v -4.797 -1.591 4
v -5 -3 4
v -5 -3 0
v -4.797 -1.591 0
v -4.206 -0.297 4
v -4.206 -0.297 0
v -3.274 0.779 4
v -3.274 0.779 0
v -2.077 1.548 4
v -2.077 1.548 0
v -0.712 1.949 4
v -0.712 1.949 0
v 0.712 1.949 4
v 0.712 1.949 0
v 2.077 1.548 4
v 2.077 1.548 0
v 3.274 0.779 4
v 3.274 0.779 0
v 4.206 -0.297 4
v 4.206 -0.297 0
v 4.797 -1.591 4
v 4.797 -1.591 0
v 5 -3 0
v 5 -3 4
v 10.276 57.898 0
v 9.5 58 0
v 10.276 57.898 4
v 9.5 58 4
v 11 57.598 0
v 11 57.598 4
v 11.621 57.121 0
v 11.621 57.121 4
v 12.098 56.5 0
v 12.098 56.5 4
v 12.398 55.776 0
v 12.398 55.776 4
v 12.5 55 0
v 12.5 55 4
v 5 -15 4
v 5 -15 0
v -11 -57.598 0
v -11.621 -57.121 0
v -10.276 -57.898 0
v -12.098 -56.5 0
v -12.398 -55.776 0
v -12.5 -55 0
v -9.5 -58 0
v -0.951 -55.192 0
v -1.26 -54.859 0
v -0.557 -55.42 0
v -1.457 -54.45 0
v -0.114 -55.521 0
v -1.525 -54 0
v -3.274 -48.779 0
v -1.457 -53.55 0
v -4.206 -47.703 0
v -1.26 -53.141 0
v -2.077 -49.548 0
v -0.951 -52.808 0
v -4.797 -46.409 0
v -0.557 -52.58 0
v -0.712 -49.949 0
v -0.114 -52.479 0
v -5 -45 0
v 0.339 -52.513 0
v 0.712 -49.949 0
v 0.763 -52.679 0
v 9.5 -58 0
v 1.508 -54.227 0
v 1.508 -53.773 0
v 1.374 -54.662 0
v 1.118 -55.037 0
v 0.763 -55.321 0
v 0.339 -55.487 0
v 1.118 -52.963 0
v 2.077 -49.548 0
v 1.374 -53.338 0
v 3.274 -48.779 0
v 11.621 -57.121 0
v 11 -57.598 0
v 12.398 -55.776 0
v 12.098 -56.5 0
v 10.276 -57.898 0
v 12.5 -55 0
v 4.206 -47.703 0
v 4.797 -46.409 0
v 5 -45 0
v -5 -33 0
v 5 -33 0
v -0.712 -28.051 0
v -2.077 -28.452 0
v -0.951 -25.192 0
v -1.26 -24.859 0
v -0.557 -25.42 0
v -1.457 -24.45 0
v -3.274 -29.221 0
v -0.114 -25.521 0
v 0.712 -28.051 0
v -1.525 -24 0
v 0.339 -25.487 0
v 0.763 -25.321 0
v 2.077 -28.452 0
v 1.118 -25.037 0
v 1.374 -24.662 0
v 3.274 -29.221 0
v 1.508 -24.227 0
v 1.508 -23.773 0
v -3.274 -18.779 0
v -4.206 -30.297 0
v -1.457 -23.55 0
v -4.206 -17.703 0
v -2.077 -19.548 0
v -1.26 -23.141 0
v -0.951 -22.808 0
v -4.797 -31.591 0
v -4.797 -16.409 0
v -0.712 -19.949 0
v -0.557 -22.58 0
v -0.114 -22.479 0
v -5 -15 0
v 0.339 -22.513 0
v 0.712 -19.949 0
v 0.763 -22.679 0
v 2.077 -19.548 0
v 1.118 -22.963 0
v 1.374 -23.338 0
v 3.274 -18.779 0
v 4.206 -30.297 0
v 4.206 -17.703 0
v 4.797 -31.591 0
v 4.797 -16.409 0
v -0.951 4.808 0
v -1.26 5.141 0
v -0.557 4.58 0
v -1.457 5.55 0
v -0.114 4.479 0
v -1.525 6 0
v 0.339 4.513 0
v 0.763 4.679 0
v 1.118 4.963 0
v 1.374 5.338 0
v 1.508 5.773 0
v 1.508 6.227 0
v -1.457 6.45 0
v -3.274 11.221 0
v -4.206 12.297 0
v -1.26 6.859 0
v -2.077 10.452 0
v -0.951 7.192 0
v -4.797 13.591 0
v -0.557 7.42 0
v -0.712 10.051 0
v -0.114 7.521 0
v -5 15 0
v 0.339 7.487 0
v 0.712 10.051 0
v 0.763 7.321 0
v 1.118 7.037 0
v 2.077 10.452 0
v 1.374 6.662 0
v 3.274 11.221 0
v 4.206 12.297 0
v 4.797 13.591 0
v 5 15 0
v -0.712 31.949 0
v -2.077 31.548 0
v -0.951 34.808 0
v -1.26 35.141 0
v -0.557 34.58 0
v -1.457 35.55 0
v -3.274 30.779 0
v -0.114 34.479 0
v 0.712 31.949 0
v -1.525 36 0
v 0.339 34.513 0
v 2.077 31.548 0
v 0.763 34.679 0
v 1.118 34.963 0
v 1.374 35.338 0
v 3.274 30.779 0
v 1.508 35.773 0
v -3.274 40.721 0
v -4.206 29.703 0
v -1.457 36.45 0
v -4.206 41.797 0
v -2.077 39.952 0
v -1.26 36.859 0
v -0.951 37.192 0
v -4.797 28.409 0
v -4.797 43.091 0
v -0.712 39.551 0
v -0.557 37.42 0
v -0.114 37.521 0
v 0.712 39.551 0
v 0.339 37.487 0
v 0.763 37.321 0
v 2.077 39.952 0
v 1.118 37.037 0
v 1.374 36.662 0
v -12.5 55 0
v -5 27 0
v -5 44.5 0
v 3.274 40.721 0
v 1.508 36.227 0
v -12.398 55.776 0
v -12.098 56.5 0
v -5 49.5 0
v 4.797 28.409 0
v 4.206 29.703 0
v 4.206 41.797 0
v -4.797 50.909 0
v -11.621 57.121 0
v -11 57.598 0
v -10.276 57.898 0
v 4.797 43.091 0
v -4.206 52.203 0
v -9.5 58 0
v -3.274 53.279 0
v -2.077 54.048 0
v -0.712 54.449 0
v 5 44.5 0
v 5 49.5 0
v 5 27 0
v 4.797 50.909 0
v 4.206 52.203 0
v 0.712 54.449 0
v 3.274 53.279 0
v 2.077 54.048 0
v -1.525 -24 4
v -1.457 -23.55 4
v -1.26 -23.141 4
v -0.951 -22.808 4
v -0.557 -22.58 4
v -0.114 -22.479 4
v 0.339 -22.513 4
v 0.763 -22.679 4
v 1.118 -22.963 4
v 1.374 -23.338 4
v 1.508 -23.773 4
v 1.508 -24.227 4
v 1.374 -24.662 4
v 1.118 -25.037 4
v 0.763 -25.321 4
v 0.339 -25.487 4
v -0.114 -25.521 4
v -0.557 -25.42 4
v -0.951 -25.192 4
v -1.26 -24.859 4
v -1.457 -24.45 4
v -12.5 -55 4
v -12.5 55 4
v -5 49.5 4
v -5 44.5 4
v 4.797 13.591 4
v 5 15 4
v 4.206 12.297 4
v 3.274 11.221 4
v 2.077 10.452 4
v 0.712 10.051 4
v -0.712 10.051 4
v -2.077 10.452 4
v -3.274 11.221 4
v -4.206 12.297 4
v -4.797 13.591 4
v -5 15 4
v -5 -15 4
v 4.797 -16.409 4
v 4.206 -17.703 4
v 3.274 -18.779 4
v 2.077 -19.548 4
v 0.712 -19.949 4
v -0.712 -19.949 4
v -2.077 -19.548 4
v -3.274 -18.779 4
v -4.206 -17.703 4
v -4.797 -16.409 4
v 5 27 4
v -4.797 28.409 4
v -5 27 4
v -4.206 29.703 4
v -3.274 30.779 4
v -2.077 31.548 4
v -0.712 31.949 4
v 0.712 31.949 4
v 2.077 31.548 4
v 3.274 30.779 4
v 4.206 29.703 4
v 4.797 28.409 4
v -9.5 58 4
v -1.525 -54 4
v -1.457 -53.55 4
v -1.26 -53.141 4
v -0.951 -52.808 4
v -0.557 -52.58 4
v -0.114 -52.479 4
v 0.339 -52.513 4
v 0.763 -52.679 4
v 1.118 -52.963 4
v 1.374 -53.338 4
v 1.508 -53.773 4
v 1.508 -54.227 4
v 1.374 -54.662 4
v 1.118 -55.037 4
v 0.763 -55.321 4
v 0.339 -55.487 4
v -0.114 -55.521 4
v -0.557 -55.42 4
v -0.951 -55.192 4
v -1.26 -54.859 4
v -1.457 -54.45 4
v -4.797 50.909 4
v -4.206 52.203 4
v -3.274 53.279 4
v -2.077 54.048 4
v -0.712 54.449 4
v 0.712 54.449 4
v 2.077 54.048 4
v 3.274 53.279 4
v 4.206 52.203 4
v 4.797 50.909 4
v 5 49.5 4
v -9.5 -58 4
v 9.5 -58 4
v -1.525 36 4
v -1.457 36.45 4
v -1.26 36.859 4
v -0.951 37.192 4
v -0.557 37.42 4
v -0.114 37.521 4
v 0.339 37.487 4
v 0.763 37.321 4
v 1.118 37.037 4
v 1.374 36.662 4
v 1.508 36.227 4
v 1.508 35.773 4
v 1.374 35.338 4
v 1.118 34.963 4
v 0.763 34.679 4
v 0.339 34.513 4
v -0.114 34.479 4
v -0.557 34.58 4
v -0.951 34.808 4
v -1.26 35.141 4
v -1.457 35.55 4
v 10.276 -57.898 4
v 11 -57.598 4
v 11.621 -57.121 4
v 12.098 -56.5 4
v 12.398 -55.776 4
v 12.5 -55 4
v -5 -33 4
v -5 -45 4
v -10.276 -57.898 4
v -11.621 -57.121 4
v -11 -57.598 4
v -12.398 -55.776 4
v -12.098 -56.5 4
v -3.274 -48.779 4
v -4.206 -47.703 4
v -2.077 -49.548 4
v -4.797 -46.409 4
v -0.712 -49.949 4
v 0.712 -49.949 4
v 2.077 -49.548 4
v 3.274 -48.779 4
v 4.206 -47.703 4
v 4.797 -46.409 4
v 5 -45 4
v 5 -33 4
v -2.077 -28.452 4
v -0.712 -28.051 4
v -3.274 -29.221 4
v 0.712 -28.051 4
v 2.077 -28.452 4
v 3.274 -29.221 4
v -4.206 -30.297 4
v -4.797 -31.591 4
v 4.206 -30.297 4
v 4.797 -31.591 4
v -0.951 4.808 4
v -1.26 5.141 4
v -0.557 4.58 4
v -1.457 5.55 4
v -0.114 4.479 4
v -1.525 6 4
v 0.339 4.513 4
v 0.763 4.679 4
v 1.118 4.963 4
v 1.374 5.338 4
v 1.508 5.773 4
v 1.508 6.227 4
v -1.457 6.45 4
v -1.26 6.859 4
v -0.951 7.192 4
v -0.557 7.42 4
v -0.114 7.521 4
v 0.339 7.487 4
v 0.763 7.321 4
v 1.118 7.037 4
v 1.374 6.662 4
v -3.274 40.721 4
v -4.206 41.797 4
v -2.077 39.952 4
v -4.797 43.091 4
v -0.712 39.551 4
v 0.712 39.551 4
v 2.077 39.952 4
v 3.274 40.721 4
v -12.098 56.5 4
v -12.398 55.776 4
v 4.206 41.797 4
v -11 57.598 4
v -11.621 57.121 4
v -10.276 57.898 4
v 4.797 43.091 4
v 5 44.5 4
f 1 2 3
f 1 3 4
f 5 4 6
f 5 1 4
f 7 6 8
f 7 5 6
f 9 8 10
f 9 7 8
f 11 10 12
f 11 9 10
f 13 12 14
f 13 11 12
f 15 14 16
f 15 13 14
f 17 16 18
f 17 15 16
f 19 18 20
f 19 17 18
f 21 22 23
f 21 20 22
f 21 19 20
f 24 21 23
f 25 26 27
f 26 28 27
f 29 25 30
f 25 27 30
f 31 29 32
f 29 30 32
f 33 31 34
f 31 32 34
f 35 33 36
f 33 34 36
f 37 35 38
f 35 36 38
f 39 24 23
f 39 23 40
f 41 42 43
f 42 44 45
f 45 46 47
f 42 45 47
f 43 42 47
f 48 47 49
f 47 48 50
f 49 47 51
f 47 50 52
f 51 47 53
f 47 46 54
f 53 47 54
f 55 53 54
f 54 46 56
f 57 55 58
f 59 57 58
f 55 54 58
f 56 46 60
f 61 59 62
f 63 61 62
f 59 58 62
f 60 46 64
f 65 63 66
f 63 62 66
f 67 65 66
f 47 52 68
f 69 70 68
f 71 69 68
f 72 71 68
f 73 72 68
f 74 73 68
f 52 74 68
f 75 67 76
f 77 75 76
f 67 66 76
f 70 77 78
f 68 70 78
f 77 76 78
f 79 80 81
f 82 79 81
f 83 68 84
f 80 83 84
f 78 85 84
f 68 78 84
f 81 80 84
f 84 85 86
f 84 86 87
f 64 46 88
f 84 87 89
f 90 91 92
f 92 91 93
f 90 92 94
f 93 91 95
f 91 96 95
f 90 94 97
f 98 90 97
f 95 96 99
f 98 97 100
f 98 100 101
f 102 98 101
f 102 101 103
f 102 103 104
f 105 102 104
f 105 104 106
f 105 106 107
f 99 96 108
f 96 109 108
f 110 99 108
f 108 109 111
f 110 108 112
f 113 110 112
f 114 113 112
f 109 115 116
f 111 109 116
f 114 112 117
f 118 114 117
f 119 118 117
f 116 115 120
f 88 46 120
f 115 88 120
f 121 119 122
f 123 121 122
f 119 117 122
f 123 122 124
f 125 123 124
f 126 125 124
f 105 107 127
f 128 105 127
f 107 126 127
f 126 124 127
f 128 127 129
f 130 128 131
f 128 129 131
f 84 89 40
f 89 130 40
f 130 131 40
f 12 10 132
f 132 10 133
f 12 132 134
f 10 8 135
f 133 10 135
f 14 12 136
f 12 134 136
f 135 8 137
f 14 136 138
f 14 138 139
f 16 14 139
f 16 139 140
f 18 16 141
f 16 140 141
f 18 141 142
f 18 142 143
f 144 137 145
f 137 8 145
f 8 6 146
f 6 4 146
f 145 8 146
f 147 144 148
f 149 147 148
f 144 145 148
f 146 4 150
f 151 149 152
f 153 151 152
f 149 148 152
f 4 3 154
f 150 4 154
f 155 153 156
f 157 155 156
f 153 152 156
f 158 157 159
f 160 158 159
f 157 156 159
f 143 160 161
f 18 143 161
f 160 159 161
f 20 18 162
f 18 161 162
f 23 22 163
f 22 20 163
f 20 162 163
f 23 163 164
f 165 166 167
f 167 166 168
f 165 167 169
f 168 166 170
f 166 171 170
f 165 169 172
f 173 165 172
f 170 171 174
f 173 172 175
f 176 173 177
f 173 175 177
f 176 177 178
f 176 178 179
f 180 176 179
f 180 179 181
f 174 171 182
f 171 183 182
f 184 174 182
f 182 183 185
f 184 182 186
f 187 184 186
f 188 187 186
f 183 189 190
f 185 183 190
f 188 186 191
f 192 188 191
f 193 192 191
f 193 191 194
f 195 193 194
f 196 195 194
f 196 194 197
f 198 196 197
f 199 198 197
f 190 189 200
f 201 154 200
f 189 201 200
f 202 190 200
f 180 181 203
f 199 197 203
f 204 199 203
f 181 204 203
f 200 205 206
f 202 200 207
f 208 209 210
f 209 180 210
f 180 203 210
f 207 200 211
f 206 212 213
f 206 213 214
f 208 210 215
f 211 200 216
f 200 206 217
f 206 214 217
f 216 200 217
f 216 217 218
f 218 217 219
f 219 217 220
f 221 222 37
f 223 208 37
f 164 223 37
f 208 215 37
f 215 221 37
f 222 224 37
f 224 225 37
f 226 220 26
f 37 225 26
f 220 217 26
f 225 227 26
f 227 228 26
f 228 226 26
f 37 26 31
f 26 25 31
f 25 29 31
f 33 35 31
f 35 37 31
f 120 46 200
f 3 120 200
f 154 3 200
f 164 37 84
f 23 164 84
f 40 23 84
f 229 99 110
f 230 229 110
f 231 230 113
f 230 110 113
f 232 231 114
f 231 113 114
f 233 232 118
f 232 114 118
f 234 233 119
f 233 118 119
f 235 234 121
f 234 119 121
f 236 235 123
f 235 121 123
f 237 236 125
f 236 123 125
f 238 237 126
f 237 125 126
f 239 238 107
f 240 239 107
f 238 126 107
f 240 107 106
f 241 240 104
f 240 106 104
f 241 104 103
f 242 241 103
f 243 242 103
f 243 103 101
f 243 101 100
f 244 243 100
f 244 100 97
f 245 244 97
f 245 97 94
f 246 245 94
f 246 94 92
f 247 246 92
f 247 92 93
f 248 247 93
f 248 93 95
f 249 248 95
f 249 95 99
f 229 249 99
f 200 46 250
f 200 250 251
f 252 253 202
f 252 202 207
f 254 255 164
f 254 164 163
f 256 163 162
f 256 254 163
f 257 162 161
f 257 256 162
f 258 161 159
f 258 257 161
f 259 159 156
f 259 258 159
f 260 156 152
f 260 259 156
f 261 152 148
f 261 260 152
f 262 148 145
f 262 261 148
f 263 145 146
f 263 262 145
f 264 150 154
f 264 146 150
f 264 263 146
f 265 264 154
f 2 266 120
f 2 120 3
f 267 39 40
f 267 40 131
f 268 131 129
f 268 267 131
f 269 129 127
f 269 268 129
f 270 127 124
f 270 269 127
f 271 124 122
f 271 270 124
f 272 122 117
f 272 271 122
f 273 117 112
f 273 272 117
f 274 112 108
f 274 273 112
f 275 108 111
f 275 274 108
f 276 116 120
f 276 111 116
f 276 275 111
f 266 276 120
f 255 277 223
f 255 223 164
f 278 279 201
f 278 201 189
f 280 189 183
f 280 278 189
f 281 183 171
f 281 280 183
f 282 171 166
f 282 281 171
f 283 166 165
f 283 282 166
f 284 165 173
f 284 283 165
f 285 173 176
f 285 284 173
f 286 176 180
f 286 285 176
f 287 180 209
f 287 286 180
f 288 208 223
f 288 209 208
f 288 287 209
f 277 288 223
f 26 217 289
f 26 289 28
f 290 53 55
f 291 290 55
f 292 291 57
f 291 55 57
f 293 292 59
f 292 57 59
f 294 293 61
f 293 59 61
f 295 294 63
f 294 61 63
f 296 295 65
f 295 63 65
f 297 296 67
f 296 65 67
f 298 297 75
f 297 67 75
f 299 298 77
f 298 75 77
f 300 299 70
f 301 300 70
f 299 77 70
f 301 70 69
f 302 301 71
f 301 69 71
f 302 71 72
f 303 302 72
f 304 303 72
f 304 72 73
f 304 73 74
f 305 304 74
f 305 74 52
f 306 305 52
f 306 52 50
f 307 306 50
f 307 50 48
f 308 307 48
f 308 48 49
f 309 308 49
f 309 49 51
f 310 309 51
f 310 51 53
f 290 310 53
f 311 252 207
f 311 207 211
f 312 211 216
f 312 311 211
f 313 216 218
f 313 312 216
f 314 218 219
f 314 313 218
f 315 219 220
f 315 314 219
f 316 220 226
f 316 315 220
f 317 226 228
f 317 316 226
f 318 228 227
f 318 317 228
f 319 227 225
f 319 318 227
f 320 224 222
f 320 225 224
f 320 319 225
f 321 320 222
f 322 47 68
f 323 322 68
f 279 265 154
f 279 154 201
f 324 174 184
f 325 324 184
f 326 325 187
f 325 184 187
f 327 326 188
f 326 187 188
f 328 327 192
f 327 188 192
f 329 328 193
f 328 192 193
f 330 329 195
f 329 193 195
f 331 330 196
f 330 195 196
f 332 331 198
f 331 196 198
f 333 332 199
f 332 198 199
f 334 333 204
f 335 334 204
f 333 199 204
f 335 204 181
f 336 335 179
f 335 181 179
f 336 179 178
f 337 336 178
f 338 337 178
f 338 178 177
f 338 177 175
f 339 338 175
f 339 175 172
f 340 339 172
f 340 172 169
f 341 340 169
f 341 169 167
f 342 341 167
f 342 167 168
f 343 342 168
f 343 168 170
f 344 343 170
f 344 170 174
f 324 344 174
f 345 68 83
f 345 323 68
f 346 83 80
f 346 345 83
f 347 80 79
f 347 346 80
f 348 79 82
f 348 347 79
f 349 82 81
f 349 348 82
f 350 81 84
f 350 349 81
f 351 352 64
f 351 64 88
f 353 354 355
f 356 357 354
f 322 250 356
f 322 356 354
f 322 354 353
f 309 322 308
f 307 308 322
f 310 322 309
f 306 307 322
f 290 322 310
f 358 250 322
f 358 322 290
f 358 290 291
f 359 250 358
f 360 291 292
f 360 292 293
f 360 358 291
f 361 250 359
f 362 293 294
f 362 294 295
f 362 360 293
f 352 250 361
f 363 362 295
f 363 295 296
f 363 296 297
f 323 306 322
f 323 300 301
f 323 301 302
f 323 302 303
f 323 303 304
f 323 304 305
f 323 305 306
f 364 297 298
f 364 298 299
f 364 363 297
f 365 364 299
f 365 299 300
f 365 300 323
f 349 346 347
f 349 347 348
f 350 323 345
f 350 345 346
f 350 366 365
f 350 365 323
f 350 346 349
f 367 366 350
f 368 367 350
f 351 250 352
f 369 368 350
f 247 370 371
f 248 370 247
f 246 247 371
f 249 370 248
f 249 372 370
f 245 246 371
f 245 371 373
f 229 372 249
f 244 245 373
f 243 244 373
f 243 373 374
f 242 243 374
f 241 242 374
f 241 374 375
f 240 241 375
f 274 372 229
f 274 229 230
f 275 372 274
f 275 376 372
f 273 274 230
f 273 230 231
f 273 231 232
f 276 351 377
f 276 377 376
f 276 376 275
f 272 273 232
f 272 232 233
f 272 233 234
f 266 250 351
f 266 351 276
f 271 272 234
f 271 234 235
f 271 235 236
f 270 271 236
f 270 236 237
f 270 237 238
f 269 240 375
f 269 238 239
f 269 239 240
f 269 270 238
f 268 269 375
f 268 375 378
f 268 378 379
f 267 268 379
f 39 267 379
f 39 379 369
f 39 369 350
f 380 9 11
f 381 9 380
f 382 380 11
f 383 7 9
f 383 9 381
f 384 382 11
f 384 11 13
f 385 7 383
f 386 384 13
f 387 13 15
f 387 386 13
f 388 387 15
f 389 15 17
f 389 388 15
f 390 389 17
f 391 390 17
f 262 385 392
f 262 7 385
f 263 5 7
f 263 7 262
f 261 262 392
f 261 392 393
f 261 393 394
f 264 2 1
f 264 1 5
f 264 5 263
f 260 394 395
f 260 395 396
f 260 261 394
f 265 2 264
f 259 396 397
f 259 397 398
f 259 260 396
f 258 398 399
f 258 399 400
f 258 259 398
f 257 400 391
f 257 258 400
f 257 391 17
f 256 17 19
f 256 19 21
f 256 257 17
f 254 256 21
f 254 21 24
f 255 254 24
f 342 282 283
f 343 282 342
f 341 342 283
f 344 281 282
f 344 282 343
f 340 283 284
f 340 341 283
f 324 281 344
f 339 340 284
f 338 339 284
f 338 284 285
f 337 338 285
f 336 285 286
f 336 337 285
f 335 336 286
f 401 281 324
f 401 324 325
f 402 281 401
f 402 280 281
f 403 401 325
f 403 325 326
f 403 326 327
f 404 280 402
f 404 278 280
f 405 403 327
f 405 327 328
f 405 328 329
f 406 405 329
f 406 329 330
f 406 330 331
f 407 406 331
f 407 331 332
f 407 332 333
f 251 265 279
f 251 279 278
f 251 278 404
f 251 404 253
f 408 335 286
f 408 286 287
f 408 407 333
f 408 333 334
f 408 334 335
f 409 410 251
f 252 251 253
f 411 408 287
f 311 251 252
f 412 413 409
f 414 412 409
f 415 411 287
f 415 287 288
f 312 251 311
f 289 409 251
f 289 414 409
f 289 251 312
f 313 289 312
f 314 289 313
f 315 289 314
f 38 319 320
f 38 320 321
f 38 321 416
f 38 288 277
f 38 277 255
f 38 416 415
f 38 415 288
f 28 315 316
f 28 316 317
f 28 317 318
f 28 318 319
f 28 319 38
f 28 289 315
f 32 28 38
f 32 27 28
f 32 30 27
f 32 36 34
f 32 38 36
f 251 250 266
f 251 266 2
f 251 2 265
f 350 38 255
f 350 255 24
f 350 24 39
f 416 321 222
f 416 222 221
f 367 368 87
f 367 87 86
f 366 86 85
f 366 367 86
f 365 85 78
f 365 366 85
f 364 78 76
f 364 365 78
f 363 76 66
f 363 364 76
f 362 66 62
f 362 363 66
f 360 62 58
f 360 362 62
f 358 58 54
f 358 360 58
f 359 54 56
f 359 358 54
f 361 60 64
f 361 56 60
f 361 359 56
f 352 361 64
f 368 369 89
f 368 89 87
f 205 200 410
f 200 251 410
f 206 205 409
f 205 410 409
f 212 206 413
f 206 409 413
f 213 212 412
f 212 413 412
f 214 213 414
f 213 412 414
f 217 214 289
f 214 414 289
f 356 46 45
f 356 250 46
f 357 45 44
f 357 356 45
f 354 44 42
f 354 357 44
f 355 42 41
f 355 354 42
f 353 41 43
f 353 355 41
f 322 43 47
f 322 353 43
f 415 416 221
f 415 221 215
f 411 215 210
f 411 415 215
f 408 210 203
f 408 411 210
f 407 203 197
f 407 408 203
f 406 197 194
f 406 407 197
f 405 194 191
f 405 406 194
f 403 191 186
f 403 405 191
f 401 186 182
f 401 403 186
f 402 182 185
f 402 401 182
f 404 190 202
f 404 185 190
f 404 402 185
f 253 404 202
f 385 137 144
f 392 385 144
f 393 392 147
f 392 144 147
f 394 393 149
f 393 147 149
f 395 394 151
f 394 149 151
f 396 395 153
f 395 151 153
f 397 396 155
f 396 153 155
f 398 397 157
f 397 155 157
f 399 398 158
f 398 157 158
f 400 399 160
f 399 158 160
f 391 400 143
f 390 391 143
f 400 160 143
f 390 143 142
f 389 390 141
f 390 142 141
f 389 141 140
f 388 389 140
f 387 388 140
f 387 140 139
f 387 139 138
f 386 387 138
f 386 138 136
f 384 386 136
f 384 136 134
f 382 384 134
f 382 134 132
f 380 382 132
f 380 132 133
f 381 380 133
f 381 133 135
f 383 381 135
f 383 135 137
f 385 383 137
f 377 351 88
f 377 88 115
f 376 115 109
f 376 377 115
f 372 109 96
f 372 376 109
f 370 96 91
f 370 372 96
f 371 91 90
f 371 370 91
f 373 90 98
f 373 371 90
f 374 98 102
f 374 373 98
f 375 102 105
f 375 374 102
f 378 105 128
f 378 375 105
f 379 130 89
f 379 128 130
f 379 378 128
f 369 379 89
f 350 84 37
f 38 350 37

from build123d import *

# Parameters (mm, degrees)
SKETCH_1_W               = 25
SKETCH_1_H               = 116
EXTRUDE_1_DEPTH          = 4
SKETCH_2_R               = 1.525
CUT_EXTRUDE_1_DEPTH      = 1
CUT_EXTRUDE_1_DEPTH_BACK = 5
FILLET_1_R               = 3
CUT_EXTRUDE_2_DEPTH      = 1
CUT_EXTRUDE_2_DEPTH_BACK = 5


with BuildPart() as part:
    # 草图1 → 凸台-拉伸1 (new body)
    with BuildSketch(Plane.XY):
        Rectangle(SKETCH_1_W, SKETCH_1_H)
    extrude(amount=EXTRUDE_1_DEPTH)

    # 草图2 → 切除-拉伸1 (cut, two sides)
    with BuildSketch(Plane(origin=(0, 0, 0), x_dir=(-1, 0, 0), z_dir=(0, 0, -1))) as cut_extrude_1_sk:
        with Locations((0, -54.000000001)):
            Circle(SKETCH_2_R)
        with Locations((0, -24.000000001)):
            Circle(SKETCH_2_R)
        with Locations((0, 5.999999999)):
            Circle(SKETCH_2_R)
        with Locations((0, 35.999999999)):
            Circle(SKETCH_2_R)
    extrude(amount=CUT_EXTRUDE_1_DEPTH, mode=Mode.SUBTRACT)
    extrude(cut_extrude_1_sk.sketch, amount=-CUT_EXTRUDE_1_DEPTH_BACK, mode=Mode.SUBTRACT)

    # 圆角1
    fillet_1_edges = [part.edges().sort_by_distance(p)[0] for p in [
        (12.5, -58, 2),
        (-12.5, -58, 2),
        (-12.5, 58, 2),
        (12.5, 58, 2),
    ]]
    fillet(fillet_1_edges, radius=FILLET_1_R)

    # 草图4 → 切除-拉伸2 (cut, two sides)
    with BuildSketch(Plane.XY.offset(4)) as cut_extrude_2_sk:
        with BuildLine():
            Line((-5, 14.999999999), (-5, 26.999999999))
            ThreePointArc((-5, 26.999999999), (0, 31.999999999), (5, 26.999999999))
            Line((5, 26.999999999), (5, 14.999999999))
            ThreePointArc((5, 14.999999999), (0, 9.999999999), (-5, 14.999999999))
        make_face()
        with BuildLine():
            Line((-5, -45.000000001), (-5, -33.000000001))
            ThreePointArc((-5, -33.000000001), (0, -28.000000001), (5, -33.000000001))
            Line((5, -33.000000001), (5, -45.000000001))
            ThreePointArc((5, -45.000000001), (0, -50.000000001), (-5, -45.000000001))
        make_face()
        with BuildLine():
            Line((-5, -15.000000001), (-5, -3.000000001))
            ThreePointArc((-5, -3.000000001), (0, 1.999999999), (5, -3.000000001))
            Line((5, -3.000000001), (5, -15.000000001))
            ThreePointArc((5, -15.000000001), (0, -20.000000001), (-5, -15.000000001))
        make_face()
        with BuildLine():
            Line((-5, 44.499999999), (-5, 49.499999999))
            ThreePointArc((-5, 49.499999999), (0, 54.499999999), (5, 49.499999999))
            Line((5, 49.499999999), (5, 44.499999999))
            ThreePointArc((5, 44.499999999), (0, 39.499999999), (-5, 44.499999999))
        make_face()
    extrude(amount=CUT_EXTRUDE_2_DEPTH, mode=Mode.SUBTRACT)
    extrude(cut_extrude_2_sk.sketch, amount=-CUT_EXTRUDE_2_DEPTH_BACK, mode=Mode.SUBTRACT)


solid = part.part
